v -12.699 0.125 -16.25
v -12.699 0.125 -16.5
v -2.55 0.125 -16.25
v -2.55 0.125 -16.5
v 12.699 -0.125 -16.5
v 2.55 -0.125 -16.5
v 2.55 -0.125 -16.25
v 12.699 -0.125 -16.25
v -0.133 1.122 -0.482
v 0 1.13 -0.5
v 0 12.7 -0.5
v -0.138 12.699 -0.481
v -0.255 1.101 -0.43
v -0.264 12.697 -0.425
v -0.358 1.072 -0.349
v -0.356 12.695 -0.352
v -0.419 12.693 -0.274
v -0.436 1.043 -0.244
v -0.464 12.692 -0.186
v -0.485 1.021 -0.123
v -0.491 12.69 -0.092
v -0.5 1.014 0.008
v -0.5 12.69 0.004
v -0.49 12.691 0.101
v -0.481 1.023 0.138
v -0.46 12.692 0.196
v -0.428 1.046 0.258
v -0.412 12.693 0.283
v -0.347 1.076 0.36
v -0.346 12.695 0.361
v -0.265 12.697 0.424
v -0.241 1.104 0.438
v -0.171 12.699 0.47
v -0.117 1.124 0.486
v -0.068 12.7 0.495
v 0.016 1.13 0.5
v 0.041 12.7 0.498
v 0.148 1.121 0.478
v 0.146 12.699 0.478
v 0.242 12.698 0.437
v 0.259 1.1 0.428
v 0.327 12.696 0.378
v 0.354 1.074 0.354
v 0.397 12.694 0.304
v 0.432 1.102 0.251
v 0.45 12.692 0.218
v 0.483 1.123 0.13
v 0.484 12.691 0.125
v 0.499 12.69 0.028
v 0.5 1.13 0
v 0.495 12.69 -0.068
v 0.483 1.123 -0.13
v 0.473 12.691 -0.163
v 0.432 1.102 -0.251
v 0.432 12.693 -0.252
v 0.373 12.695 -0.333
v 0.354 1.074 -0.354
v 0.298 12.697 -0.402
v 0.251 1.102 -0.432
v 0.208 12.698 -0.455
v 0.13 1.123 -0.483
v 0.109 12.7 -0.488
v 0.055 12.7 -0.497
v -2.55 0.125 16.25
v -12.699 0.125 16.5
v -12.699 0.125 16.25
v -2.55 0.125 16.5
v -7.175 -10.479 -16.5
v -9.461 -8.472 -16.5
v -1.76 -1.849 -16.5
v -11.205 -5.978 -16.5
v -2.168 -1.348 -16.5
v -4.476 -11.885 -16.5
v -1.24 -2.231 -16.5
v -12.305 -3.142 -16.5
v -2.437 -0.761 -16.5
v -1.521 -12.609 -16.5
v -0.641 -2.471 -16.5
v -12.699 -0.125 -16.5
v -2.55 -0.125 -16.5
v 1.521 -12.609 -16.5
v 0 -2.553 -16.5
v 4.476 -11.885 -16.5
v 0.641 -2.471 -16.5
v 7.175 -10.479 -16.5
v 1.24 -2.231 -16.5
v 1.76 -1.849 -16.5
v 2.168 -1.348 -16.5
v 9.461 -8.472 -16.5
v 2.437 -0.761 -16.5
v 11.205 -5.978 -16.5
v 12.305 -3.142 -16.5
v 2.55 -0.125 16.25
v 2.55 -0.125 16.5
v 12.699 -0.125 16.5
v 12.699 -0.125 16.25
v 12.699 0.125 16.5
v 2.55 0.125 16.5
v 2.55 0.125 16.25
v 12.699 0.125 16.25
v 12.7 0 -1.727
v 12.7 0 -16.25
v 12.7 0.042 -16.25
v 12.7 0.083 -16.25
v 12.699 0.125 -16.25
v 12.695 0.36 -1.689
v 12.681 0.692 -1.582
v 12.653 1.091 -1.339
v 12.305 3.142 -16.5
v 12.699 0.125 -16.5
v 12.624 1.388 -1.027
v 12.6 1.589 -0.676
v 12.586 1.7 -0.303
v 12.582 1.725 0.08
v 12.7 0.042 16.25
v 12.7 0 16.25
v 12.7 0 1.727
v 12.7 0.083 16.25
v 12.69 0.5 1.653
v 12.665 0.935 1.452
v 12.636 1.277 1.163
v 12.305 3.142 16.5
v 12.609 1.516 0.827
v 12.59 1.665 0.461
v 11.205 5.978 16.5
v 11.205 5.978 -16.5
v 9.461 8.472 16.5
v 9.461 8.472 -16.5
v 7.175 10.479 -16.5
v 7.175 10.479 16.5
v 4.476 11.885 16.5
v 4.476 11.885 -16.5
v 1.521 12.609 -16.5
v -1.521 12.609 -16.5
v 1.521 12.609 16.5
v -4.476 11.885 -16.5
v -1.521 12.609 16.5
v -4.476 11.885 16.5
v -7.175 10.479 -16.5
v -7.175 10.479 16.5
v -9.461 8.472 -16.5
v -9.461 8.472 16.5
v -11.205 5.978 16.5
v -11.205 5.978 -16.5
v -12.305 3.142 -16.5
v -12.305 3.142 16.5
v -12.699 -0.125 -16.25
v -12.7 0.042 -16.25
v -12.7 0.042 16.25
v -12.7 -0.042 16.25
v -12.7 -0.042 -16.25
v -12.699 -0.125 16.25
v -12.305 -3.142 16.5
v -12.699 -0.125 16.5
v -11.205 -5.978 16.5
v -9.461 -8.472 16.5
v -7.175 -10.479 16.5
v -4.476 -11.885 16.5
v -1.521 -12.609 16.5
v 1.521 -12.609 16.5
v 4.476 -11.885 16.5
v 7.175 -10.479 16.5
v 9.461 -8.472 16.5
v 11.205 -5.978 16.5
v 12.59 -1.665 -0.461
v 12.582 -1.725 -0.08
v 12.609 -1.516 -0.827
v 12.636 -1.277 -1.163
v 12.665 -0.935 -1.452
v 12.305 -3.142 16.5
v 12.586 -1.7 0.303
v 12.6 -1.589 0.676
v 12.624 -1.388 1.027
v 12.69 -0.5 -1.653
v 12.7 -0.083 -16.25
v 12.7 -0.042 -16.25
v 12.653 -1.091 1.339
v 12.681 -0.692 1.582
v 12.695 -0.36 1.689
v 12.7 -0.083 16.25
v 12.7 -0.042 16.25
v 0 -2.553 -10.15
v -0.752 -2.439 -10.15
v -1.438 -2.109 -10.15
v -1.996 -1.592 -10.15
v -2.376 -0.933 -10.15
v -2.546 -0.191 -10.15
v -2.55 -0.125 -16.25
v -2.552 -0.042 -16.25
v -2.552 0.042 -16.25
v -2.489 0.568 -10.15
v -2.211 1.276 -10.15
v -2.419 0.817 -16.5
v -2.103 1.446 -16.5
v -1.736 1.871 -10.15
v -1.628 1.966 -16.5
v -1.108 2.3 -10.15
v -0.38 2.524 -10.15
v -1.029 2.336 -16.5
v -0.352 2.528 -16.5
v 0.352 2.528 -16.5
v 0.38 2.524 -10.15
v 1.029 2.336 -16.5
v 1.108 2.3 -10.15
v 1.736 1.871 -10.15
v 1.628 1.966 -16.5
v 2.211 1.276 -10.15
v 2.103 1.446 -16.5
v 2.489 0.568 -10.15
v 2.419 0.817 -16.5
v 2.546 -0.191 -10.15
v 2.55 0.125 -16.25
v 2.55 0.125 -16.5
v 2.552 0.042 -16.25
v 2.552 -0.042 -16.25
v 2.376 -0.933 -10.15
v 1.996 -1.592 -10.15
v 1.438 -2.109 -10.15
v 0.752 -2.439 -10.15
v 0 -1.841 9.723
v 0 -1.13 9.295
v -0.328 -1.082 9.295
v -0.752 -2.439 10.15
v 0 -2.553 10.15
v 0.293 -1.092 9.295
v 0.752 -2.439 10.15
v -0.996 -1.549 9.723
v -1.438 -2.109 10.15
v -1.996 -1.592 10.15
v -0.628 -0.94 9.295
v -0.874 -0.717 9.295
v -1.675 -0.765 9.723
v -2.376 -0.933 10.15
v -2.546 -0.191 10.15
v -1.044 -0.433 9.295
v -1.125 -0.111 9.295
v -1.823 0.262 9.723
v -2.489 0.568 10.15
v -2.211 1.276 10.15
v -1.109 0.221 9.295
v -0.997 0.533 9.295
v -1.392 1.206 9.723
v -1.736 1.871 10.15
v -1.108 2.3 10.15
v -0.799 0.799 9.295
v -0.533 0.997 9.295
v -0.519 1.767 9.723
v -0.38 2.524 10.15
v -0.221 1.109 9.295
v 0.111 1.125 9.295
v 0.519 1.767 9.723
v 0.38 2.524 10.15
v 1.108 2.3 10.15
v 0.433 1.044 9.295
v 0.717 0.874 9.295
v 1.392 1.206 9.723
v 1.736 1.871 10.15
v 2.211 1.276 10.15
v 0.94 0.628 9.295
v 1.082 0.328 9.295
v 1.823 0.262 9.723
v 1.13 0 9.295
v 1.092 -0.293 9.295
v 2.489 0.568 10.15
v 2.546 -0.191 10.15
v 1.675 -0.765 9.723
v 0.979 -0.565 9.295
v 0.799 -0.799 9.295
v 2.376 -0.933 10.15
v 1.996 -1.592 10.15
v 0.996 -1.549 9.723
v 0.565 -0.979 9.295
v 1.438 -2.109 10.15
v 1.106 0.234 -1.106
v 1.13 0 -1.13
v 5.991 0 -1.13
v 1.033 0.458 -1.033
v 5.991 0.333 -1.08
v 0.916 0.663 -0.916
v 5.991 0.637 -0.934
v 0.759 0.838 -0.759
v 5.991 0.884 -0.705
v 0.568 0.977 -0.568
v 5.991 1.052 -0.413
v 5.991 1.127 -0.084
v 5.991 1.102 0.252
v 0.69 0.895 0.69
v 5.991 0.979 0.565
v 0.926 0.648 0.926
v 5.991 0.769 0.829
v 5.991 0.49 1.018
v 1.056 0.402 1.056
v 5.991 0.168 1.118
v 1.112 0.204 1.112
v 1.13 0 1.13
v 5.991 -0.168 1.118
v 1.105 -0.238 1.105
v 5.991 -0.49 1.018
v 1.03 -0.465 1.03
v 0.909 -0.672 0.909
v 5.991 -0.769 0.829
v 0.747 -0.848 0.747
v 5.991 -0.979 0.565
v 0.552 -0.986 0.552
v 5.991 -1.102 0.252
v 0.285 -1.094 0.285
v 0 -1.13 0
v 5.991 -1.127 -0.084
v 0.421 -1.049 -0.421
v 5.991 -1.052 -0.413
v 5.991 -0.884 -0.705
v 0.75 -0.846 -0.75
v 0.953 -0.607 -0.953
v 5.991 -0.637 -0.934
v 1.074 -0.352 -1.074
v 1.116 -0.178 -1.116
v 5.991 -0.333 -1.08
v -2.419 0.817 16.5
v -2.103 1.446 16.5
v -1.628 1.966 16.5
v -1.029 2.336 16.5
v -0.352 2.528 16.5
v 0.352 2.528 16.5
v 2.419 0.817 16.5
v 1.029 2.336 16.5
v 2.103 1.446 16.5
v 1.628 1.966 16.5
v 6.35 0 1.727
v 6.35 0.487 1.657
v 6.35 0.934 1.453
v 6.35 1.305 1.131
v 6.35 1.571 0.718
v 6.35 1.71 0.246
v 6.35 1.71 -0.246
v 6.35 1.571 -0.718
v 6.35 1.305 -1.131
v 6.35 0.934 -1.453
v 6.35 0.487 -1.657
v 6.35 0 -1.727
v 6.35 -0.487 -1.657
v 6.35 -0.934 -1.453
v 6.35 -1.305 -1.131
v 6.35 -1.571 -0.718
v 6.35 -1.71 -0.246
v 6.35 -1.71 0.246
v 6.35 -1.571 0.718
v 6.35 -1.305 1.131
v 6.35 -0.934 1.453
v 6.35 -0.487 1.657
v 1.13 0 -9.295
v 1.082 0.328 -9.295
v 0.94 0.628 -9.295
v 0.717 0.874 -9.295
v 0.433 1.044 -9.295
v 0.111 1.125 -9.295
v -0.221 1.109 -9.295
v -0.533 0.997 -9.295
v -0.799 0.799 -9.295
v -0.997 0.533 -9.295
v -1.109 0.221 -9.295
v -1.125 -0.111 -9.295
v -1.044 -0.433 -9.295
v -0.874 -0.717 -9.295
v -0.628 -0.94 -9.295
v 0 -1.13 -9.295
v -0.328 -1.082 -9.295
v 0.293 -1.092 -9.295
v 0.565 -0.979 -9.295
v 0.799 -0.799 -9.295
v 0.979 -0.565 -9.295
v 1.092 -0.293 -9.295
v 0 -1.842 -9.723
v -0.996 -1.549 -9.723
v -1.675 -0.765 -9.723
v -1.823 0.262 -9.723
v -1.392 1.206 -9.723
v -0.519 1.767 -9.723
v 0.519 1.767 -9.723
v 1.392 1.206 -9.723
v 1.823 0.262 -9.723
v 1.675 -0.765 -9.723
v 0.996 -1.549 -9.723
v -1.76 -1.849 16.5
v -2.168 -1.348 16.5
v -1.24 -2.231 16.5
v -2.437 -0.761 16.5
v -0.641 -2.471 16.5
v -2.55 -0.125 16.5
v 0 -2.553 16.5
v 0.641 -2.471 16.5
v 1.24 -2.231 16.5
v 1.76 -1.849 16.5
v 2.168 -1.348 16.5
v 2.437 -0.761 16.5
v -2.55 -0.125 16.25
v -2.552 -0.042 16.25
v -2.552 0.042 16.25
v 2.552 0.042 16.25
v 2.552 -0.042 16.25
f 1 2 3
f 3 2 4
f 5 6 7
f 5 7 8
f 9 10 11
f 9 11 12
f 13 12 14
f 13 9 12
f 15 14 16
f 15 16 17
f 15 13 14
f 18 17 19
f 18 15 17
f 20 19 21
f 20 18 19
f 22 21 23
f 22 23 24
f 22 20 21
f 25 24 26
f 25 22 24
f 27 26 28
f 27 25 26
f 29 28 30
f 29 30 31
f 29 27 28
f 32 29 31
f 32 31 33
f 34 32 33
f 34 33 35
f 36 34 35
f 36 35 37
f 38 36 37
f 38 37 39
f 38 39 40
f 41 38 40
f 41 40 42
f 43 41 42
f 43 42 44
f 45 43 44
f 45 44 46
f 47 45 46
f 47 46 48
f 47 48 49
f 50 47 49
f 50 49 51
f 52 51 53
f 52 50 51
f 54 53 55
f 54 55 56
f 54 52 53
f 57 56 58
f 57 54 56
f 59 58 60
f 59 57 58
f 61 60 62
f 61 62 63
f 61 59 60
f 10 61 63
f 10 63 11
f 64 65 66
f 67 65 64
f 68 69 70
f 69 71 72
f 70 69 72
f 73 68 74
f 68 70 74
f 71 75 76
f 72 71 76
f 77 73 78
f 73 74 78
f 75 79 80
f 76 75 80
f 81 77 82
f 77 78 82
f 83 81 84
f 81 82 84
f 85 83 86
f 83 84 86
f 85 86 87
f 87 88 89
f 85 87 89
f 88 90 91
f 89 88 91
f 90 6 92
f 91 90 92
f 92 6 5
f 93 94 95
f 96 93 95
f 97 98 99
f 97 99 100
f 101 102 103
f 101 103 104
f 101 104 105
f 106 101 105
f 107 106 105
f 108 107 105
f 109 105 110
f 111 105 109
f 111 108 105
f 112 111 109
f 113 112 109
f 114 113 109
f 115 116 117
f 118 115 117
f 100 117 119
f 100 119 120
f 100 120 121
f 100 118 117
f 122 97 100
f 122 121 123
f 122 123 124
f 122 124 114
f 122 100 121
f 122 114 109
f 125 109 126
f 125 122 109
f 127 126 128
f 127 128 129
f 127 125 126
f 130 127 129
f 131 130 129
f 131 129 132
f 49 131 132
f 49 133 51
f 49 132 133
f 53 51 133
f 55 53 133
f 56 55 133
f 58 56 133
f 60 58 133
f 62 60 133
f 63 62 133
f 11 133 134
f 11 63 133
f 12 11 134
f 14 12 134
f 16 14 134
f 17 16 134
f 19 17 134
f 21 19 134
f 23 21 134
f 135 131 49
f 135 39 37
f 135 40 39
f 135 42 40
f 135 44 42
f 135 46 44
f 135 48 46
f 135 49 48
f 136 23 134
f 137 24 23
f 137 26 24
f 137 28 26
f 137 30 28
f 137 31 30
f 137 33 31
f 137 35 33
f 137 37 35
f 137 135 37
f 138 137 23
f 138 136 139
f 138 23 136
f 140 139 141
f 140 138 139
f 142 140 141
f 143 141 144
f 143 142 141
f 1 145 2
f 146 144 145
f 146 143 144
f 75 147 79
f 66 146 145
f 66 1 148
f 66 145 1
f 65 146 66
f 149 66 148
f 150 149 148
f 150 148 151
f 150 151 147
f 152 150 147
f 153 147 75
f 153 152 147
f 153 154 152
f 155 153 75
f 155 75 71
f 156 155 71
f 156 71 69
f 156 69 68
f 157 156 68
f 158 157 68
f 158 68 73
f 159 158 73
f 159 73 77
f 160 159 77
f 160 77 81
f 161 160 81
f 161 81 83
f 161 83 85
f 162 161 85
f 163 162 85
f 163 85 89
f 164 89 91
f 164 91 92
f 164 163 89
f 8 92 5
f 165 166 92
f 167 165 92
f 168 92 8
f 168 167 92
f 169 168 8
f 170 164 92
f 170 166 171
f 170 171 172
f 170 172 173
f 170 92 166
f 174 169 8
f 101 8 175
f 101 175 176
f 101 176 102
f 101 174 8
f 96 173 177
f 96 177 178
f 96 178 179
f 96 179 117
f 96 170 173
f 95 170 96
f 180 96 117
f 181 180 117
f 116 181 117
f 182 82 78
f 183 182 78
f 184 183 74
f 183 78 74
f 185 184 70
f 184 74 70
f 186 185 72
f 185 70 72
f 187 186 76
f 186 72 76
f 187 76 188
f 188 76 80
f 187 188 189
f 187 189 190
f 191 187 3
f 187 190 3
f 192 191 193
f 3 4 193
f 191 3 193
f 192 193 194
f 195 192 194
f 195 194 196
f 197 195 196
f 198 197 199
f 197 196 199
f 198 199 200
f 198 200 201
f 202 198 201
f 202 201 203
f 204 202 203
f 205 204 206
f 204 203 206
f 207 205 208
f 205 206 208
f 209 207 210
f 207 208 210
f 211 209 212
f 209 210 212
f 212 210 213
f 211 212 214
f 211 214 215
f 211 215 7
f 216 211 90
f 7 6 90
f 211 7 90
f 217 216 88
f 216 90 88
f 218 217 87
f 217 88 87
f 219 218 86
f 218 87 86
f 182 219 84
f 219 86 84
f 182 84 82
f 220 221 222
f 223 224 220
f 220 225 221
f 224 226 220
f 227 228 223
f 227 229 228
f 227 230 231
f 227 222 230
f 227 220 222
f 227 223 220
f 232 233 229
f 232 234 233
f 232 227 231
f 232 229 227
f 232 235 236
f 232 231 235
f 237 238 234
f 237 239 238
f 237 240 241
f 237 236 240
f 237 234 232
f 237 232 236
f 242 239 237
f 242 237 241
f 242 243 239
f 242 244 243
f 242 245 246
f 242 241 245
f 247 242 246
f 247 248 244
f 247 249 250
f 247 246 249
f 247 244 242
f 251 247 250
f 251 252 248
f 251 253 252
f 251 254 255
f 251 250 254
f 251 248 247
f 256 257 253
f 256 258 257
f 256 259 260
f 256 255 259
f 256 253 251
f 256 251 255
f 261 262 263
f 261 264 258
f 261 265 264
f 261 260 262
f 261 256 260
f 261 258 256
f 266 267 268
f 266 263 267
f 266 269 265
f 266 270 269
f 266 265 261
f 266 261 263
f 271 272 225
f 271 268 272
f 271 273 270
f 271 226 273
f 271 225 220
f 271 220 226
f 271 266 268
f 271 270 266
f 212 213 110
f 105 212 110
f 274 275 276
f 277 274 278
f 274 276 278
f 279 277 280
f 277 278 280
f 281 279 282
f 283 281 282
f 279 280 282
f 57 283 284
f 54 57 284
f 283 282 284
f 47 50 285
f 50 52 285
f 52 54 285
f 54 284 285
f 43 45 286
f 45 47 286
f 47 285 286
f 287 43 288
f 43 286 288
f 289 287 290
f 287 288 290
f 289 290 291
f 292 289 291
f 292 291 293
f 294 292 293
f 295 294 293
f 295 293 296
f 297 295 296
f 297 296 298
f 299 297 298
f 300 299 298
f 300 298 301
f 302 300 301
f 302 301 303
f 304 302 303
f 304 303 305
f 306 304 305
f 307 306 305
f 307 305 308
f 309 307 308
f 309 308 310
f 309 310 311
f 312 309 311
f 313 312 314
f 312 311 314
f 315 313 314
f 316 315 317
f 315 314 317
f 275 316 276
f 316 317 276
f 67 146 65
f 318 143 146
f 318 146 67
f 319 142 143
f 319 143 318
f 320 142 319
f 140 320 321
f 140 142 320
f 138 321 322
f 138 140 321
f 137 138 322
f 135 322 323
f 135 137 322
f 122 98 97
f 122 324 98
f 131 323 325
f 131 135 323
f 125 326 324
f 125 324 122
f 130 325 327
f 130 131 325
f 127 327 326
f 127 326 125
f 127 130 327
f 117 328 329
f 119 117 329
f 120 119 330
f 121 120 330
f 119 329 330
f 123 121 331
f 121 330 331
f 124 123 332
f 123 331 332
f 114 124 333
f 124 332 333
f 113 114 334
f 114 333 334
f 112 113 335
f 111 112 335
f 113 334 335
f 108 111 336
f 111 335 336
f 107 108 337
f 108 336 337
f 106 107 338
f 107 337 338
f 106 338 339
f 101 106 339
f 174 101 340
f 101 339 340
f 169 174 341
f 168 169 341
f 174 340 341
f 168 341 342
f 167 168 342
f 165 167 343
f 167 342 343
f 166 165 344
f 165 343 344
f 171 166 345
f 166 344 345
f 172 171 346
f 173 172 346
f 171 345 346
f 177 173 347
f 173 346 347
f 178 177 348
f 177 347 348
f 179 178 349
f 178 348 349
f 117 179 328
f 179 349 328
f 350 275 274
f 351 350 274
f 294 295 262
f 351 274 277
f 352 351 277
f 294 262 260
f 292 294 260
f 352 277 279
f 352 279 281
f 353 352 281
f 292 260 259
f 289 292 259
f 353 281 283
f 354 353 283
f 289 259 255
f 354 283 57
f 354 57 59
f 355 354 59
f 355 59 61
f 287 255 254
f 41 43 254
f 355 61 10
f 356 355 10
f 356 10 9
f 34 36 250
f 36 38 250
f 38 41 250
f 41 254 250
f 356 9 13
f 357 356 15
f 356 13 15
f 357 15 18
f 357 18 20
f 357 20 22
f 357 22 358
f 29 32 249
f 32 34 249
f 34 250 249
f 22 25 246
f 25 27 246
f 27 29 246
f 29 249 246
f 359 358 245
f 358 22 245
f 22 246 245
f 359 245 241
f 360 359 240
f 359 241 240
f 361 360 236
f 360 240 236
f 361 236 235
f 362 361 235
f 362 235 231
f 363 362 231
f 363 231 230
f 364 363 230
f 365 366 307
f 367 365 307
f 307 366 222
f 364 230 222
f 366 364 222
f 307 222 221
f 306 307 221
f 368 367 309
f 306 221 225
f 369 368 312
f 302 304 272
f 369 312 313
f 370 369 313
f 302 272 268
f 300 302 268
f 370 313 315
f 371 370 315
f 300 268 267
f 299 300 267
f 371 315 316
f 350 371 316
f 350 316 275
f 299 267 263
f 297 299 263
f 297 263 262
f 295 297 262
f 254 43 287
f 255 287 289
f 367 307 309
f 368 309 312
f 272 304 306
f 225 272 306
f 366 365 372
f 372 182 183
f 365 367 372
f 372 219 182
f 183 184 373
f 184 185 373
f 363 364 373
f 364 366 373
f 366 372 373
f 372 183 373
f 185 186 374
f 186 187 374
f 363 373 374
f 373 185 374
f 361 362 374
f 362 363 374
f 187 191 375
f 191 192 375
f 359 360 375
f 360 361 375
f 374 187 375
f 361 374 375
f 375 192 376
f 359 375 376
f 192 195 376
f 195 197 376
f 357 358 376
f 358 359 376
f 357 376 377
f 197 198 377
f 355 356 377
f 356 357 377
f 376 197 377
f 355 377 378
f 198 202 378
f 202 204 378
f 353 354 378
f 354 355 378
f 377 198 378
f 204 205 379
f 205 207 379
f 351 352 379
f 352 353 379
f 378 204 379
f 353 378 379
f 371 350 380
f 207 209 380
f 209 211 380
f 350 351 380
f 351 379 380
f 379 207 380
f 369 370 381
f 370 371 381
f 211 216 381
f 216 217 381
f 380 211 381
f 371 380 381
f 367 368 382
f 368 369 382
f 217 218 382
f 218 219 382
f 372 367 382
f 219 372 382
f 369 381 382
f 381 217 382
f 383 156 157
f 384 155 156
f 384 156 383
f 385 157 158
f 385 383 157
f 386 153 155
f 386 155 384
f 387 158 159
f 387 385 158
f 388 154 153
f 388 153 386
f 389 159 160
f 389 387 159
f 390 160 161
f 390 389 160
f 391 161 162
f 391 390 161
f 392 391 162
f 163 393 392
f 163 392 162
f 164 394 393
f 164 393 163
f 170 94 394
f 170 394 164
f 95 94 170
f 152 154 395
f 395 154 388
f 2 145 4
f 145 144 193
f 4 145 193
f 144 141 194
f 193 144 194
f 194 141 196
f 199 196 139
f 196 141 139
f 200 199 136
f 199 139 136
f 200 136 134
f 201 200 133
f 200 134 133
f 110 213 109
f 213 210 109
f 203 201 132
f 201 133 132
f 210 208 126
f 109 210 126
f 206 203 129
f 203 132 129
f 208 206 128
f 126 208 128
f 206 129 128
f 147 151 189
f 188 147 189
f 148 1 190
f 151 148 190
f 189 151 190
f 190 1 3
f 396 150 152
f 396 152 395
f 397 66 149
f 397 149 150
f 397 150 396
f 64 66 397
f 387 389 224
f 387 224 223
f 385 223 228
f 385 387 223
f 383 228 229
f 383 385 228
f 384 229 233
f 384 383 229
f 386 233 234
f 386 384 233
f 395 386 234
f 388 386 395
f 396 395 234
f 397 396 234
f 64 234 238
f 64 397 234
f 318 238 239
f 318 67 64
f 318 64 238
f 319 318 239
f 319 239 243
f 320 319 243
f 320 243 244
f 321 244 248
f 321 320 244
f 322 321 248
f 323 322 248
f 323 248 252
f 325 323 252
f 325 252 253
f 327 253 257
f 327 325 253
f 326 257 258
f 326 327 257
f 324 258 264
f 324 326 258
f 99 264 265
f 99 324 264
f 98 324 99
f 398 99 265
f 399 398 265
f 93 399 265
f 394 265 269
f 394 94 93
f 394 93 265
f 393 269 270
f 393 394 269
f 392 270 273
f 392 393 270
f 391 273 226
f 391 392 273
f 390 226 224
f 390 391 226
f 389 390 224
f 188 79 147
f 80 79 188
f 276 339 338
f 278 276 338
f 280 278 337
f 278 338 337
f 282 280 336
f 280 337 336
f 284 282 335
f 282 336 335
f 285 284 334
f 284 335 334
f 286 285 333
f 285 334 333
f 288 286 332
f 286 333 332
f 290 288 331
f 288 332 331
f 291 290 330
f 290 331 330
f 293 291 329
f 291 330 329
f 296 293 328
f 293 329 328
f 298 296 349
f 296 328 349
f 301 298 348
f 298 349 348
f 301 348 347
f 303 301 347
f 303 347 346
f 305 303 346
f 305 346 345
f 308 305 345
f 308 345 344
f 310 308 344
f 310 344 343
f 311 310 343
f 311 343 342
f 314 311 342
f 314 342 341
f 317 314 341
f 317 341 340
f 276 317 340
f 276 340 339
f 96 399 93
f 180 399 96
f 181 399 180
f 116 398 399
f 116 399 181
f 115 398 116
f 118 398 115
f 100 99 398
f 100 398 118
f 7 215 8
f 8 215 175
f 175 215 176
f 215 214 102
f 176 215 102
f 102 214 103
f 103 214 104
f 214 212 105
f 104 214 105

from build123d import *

# Parameters (mm, degrees)
SKETCH1_R                 = 12.7
BASE_EXTRUDE_DEPTH        = 16.5
SKETCH4_R                 = 1.1303
CUT_EXTRUDE1_DEPTH        = 38.570999454
F_8_32_TAPPED_HOLE1_D     = 3.4544
F_8_32_TAPPED_HOLE1_DEPTH = 6.35
F_8_32_TAPPED_HOLE1_TIP   = 1.037806461
CUT_EXTRUDE2_REACH        = 34.844
CUT_EXTRUDE2_END_RADIUS   = 1.1303
SKETCH9_R                 = 1.1303
SKETCH10_W                = 27.33350128
SKETCH10_H                = 0.25
CUT_EXTRUDE3_DEPTH        = 0.25
SKETCH11_R                = 0.5
CUT_EXTRUDE4_DEPTH        = 25.389137098


with BuildPart() as part:
    # Sketch1 → Base-Extrude (new, symmetric)
    with BuildSketch(Plane.XY):
        Circle(SKETCH1_R)
    extrude(amount=BASE_EXTRUDE_DEPTH, both=True)

    # Sketch2 → 1/4-20 Tapped Hole1 (revolve, cut)
    with BuildSketch(Plane(origin=(0, 0, 16.5), x_dir=(0, -1, 0), z_dir=(1, 0, 0))):
        Polygon((0, 0), (0, 7.883816902), (2.5527, 6.35), (2.5527, 0), align=None)
    f_1_4_20_tapped_hole1 = revolve(axis=Axis((0, 0, 22.85), (0, 0, -1)), mode=Mode.SUBTRACT)

    # Mirror1: 1/4-20 Tapped Hole1 across plane
    add(f_1_4_20_tapped_hole1.mirror(Plane.XY), mode=Mode.SUBTRACT)

    # Sketch4 → Cut-Extrude1 (cut, through all)
    with BuildSketch(Plane.XY.offset(16.5)):
        Circle(SKETCH4_R)
    extrude(amount=-CUT_EXTRUDE1_DEPTH, mode=Mode.SUBTRACT)

    # #8-32 Tapped Hole1
    with Locations(Plane(origin=(12.7, 0, 0), x_dir=(0, 0, -1), z_dir=(1, 0, 0))):
        with Locations((0, 0)):
            Hole(F_8_32_TAPPED_HOLE1_D / 2, depth=F_8_32_TAPPED_HOLE1_DEPTH)
            with Locations((0, 0, -(F_8_32_TAPPED_HOLE1_DEPTH + F_8_32_TAPPED_HOLE1_TIP / 2))):  # 118° drill point
                Cone(0, F_8_32_TAPPED_HOLE1_D / 2, F_8_32_TAPPED_HOLE1_TIP, mode=Mode.SUBTRACT)

    # Cut-Extrude2: up to this cylinder (the profile starts outside it)
    cut_extrude2_end = Plane(origin=(0, 0, 0), z_dir=(0, 0, 1)) * Cylinder(CUT_EXTRUDE2_END_RADIUS, 72.9486, mode=Mode.PRIVATE)
    # Sketch9 → Cut-Extrude2 (cut, up to the surface)
    with BuildSketch(Plane(origin=(12.7, 0, 0), x_dir=(0, 0, -1), z_dir=(1, 0, 0)), mode=Mode.PRIVATE) as cut_extrude2_sk1:
        Circle(SKETCH9_R)
    cut_extrude2_tool1 = extrude(cut_extrude2_sk1.sketch, amount=-CUT_EXTRUDE2_REACH, mode=Mode.PRIVATE) - cut_extrude2_end
    add(cut_extrude2_tool1.solids().sort_by_distance((12.7, 0, 0))[0], mode=Mode.SUBTRACT)

    # Sketch10 → Cut-Extrude3 (cut)
    with BuildSketch(Plane.XY.offset(16.5)):
        with Locations((0.215070468, 0)):
            Rectangle(SKETCH10_W, SKETCH10_H)
    cut_extrude3 = extrude(amount=-CUT_EXTRUDE3_DEPTH, mode=Mode.SUBTRACT)

    # Mirror2: Cut-Extrude3 across plane
    add(cut_extrude3.mirror(Plane.XY), mode=Mode.SUBTRACT)

    # Sketch11 → Cut-Extrude4 (cut, through all)
    with BuildSketch(Plane(origin=(0, 0, 0), x_dir=(1, 0, 0), z_dir=(0, 1, 0))):
        with Locations(Location((0, 0, 0), (0, 0, 90))):
            Circle(SKETCH11_R)
    extrude(amount=CUT_EXTRUDE4_DEPTH, mode=Mode.SUBTRACT)


solid = part.part
